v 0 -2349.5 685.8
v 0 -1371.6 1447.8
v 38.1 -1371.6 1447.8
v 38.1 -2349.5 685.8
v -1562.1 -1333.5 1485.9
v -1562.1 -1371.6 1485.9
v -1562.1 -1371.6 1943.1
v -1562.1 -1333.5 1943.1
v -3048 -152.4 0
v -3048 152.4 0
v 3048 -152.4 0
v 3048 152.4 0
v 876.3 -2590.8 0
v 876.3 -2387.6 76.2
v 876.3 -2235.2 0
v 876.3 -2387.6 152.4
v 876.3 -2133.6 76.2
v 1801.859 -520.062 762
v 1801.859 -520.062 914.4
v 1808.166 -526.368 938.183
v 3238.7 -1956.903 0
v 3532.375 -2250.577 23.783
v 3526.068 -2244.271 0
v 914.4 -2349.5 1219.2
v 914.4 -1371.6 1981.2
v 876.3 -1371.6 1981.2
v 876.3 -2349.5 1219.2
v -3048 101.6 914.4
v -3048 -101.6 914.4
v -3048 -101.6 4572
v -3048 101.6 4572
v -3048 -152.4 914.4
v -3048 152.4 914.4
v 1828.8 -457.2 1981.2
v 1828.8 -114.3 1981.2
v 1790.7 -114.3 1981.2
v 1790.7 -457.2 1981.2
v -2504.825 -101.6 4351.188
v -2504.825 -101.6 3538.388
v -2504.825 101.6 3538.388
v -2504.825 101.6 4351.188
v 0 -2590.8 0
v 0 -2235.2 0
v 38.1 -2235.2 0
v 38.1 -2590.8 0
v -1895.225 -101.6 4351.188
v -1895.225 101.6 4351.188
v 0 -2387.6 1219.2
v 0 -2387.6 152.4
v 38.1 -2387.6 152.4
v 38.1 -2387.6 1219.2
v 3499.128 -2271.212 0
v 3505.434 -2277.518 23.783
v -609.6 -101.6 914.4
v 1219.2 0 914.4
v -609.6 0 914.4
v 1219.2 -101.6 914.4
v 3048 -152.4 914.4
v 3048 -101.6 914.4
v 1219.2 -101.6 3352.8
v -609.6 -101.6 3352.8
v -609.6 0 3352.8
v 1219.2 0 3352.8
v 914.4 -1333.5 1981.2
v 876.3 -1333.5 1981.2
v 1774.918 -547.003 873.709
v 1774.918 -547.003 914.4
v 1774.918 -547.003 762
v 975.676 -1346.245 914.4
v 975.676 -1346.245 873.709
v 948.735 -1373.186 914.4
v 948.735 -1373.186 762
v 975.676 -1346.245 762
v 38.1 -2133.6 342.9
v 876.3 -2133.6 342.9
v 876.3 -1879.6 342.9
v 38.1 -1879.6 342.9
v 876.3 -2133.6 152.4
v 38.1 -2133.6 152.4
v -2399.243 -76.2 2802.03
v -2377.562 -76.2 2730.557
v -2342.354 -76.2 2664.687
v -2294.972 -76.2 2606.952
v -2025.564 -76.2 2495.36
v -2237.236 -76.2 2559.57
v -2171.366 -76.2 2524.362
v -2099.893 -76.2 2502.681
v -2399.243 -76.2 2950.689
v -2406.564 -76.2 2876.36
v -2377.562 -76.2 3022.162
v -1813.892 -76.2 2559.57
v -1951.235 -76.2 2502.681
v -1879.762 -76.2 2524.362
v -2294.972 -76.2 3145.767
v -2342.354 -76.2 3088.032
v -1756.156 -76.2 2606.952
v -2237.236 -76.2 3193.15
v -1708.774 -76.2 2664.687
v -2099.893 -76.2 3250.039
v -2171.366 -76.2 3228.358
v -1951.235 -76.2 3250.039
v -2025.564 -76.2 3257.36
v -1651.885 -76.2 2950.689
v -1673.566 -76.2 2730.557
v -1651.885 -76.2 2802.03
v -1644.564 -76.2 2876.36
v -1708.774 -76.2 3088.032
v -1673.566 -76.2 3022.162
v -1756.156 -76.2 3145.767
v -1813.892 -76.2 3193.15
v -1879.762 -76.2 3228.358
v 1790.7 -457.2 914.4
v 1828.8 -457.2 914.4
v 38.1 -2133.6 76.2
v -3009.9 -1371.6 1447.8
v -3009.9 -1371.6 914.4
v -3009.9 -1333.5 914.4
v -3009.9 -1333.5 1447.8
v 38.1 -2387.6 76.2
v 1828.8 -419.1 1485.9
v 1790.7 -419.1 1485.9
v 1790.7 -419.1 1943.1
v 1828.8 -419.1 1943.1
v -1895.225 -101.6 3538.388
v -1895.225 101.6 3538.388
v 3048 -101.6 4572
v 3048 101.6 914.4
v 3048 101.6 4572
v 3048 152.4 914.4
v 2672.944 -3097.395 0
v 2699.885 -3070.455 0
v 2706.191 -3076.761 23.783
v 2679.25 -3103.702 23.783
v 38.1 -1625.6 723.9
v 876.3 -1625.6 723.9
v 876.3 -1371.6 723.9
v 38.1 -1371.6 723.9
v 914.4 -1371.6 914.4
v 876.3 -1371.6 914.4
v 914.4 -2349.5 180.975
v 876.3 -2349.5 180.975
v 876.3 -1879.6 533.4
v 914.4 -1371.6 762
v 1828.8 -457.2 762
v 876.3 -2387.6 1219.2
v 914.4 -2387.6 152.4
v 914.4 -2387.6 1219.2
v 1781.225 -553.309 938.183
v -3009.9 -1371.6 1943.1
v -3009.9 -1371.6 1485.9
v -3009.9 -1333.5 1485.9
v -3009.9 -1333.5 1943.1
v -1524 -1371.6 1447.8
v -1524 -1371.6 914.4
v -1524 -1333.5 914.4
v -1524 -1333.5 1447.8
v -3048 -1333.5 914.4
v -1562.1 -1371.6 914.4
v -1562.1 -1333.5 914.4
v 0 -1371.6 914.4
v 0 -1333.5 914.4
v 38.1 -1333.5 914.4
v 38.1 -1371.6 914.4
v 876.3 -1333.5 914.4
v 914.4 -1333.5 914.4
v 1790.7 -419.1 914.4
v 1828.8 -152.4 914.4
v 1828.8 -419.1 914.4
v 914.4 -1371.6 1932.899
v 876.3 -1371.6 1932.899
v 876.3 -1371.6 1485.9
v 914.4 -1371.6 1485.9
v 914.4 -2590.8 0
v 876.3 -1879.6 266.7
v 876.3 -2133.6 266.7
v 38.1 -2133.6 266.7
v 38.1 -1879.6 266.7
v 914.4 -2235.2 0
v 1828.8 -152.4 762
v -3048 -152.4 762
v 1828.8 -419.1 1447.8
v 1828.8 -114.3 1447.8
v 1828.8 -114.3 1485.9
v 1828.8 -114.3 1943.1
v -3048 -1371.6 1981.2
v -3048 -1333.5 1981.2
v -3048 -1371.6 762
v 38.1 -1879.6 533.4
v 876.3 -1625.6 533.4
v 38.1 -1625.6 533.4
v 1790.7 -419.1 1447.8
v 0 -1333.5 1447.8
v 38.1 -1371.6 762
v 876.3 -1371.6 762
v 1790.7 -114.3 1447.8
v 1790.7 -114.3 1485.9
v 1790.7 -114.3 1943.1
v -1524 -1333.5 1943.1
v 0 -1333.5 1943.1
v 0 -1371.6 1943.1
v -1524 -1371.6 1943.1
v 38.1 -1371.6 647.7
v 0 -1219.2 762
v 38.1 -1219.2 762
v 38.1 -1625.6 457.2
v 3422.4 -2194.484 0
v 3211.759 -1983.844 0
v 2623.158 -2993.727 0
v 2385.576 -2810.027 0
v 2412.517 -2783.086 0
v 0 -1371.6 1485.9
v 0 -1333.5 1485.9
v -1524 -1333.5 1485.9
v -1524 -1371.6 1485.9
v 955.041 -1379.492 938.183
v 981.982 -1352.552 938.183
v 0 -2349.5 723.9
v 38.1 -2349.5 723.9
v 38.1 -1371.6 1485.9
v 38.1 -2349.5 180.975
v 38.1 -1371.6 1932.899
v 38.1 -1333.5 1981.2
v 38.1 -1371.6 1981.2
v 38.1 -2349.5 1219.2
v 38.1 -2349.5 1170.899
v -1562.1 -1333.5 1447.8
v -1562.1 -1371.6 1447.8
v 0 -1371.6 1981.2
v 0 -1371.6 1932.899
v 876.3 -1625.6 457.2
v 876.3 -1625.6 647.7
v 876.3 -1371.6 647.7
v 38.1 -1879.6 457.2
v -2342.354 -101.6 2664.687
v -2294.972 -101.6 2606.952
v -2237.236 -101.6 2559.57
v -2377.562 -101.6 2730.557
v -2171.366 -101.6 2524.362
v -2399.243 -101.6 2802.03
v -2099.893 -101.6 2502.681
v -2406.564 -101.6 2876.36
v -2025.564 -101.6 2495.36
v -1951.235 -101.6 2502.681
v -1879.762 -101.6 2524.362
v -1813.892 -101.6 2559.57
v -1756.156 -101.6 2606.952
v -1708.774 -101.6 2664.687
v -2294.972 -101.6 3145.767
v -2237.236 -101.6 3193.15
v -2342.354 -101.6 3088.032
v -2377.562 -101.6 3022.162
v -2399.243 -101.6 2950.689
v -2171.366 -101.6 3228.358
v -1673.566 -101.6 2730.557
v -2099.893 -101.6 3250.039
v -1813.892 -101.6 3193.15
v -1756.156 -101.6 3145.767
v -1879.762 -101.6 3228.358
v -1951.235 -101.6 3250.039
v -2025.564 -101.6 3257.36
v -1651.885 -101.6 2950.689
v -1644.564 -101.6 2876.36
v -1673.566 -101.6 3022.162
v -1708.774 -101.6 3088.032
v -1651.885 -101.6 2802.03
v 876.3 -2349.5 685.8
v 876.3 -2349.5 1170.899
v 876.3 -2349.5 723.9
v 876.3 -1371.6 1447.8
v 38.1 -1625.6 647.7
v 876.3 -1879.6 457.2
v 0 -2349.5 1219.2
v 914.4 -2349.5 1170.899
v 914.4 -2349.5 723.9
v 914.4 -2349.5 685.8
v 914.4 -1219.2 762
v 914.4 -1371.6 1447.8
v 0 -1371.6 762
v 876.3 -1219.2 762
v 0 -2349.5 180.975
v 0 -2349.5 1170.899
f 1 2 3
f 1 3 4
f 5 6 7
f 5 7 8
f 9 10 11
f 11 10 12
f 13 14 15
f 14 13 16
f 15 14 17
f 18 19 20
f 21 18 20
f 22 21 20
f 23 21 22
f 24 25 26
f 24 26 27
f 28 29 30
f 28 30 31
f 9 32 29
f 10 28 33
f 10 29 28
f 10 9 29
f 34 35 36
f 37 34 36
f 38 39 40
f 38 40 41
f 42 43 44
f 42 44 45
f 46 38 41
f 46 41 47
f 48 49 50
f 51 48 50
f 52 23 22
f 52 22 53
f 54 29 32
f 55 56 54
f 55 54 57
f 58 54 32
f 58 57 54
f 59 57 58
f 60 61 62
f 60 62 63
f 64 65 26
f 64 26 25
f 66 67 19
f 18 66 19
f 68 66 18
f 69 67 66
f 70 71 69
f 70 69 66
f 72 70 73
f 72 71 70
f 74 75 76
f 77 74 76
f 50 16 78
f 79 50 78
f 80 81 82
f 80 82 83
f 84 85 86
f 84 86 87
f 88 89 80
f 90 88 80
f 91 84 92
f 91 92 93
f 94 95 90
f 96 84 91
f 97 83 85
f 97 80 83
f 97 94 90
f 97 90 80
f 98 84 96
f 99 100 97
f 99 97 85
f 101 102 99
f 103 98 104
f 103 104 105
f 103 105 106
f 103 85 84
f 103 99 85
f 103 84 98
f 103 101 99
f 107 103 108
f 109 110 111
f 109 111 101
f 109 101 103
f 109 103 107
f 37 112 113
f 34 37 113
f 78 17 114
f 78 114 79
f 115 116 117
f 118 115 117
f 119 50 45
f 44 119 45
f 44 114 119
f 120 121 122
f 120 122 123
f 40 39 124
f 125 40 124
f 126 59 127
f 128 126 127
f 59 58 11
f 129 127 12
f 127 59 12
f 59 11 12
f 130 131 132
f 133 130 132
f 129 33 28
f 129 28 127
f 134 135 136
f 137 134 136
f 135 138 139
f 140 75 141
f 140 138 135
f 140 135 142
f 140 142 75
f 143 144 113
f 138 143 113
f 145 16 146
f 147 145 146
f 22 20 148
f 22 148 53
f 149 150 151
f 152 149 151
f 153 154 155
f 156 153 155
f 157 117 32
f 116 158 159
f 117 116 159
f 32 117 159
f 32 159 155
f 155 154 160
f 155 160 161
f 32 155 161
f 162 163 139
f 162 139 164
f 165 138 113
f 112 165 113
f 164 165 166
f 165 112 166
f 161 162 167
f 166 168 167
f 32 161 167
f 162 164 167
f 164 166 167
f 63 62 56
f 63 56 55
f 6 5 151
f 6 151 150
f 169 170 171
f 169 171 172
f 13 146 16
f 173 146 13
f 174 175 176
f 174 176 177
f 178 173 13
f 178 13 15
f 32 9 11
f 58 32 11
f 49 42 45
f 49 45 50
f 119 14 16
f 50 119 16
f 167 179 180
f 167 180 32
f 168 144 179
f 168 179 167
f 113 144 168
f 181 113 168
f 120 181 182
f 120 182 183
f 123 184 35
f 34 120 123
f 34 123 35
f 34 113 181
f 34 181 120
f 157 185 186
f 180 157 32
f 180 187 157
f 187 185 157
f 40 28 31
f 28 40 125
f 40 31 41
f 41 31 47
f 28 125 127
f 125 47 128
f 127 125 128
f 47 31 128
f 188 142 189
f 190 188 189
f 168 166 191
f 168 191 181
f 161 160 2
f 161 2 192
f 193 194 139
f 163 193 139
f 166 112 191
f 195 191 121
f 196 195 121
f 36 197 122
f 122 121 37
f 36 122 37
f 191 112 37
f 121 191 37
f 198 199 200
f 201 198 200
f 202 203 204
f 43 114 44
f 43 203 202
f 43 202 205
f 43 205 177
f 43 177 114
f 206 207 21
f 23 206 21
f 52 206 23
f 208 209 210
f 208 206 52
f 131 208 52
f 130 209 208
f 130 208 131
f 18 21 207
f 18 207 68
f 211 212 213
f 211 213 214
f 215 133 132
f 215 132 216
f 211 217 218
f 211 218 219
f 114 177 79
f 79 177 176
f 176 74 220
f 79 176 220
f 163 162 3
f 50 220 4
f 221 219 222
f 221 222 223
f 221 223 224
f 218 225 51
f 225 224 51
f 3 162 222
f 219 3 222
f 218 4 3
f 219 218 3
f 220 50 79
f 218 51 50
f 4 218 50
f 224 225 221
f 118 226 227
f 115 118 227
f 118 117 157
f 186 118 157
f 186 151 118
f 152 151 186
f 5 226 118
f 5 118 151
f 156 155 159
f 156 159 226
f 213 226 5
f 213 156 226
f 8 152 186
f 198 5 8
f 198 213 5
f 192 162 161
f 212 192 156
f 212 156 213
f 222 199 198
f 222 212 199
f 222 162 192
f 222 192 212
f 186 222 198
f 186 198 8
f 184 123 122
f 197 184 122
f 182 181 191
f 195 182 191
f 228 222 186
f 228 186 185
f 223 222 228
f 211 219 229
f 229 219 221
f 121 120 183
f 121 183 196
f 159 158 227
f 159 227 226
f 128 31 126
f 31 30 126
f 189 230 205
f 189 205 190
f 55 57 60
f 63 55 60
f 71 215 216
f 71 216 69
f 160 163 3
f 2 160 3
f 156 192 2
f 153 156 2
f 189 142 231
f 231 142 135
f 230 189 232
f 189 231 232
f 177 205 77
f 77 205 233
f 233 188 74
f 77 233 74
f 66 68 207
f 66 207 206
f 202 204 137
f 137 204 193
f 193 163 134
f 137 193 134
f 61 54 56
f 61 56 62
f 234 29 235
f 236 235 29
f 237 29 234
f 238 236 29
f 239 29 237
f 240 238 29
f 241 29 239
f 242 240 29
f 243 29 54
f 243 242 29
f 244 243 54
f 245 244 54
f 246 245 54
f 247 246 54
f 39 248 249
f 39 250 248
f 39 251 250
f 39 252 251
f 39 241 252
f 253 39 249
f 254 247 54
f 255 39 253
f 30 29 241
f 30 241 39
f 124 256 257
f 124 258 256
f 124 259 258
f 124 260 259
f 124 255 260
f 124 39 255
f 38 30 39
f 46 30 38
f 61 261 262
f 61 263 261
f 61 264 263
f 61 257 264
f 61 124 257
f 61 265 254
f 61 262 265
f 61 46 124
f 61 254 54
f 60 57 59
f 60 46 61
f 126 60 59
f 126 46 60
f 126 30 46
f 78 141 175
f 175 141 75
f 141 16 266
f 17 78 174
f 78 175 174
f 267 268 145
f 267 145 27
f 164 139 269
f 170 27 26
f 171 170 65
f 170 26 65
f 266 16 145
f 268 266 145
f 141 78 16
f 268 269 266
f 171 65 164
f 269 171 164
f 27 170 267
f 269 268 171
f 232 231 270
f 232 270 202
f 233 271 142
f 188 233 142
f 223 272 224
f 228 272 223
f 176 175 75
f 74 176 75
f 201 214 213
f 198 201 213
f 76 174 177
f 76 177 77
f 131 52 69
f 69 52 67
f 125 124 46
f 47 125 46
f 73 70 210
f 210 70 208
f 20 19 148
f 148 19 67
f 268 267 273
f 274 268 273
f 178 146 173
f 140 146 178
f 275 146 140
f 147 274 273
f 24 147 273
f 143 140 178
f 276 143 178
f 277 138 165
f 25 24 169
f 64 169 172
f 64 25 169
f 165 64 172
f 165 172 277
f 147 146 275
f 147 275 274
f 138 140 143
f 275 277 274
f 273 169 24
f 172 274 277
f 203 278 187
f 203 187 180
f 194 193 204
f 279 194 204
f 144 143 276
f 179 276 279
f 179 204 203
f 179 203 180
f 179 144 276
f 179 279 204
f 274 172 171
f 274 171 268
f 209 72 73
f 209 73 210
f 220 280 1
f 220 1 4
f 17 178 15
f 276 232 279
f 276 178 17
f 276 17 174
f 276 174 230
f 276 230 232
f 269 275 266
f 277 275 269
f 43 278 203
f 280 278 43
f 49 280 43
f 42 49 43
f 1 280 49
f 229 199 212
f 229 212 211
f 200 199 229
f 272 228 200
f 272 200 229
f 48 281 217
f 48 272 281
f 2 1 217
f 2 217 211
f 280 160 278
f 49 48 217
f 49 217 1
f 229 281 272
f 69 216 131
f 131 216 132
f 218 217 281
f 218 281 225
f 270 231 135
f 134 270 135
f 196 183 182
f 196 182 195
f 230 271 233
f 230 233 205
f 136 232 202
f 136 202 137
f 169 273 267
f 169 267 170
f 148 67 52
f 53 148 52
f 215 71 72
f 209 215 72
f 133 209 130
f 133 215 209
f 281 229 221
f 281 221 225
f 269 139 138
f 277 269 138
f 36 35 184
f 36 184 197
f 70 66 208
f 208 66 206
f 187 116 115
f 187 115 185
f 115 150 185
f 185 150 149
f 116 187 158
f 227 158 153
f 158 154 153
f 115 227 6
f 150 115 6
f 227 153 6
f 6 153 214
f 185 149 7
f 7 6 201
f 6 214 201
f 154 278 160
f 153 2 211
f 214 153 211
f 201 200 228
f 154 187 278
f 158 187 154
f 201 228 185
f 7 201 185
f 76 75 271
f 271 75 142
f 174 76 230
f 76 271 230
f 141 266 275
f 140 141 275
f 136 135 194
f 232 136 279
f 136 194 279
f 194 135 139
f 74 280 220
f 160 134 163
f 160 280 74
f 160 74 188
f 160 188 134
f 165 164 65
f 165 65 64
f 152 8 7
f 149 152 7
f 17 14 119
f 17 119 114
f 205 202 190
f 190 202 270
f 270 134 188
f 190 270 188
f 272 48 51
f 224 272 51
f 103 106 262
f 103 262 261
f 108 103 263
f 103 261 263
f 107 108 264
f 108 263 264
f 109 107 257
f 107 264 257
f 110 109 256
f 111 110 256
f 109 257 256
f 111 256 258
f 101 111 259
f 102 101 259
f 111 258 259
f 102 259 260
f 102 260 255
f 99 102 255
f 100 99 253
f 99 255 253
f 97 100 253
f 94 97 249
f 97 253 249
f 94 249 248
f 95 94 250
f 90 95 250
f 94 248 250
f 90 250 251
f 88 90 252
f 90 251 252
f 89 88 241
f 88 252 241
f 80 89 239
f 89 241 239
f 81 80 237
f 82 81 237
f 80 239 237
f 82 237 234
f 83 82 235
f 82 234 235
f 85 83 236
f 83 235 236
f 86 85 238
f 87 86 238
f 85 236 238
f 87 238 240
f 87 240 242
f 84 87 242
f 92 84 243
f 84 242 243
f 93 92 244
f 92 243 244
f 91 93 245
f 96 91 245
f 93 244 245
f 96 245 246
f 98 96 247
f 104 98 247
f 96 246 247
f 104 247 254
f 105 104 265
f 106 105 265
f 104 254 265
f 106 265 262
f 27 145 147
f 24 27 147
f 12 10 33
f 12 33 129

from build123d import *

# Parameters (mm, degrees)
F0_W      = 6096
F0_H      = 304.8
F1_DEPTH  = 914.4
F2_W      = 6096
F2_H      = 3657.6
F3_DEPTH  = 101.6
F5_W      = 1219.2
F5_H      = 152.4
F6_DEPTH  = 4876.8
F7_W      = 1828.8
F7_H      = 2438.4
F8_DEPTH  = 101.6
F9_SIZE   = 914.4
F12_W     = 254
F12_H     = 76.2
F13_DEPTH = 38.1
F14_DEPTH = 914.4
F15_W     = 254
F15_H     = 76.2
F16_DEPTH = 38.1
F17_W     = 38.1
F17_H     = 38.1
F18_DEPTH = 1066.8
F19_W     = 38.1
F19_H     = 38.1
F20_DEPTH = 3048
F21_W     = 38.1
F21_H     = 38.1
F22_DEPTH = 304.8
F23_W     = 38.1
F23_H     = 38.1
F24_DEPTH = 1066.8
F26_DEPTH = 38.1
F28_DEPTH = 38.1
F32_DEPTH = 38.1
F34_DEPTH = 25.4
F35_DEPTH = 1168.4
F37_DEPTH = 38.1
F38_R     = 381
F39_DEPTH = 25.4
F40_W     = 609.6
F40_H     = 812.8
F41_DEPTH = 254.001


with BuildPart() as f1:
    # F0 (on Top) → F1 (new body)
    with BuildSketch(Plane.XY):
        Rectangle(F0_W, F0_H)
    extrude(amount=F1_DEPTH)

    # F2 (on Front) → F3 (join, symmetric)
    with BuildSketch(Plane.XZ):
        with Locations((0, 2743.2)):
            Rectangle(F2_W, F2_H)
    extrude(amount=F3_DEPTH, both=True)

    # F7 (on face) → F8 (cut)
    with BuildSketch(Plane.XZ.offset(101.6)):
        with Locations((304.8, 2133.6)):
            Rectangle(F7_W, F7_H)
    extrude(amount=-F8_DEPTH, mode=Mode.SUBTRACT)

    # F38 (on face) → F39 (cut)
    with BuildSketch(Plane.XZ.offset(101.6)):
        with Locations((-2025.563955307, 2876.3597011566)):
            Circle(F38_R)
    extrude(amount=-F39_DEPTH, mode=Mode.SUBTRACT)

    # F40 (on face) → F41 (cut, through all)
    with BuildSketch(Plane.XZ.offset(101.6)):
        with Locations((-2200.0251152039, 3944.7877754211)):
            Rectangle(F40_W, F40_H)
    extrude(amount=-F41_DEPTH, mode=Mode.SUBTRACT)


with BuildPart() as f6:
    # F5 (on offset) → F6 (new body)
    with BuildSketch(Plane.YZ.offset(1828.8)):
        with Locations((-762, 838.2)):
            Rectangle(F5_W, F5_H)
    extrude(amount=-F6_DEPTH)

    # F9
    f9_edges = [f6.edges().sort_by_distance(p)[0] for p in [
        (1828.8, -1371.6, 838.2),
    ]]
    chamfer(f9_edges, length=F9_SIZE)

    # F12 (on plane+point) → F13 (join)
    with BuildSketch(Plane.YZ.offset(914.4)):
        Polygon((-2235.2, 0), (-2133.6, 76.2), (-2387.6, 76.2), (-2387.6, 152.4), (-2590.8, 0), align=None)
        with Locations((-2260.6, 114.3)):
            Rectangle(F12_W, F12_H)
        Polygon((-2133.6, 76.2), (-1879.6, 266.7), (-2133.6, 266.7), (-2133.6, 342.9), (-2387.6, 152.4), (-2133.6, 152.4), align=None)
        with Locations((-2006.6, 304.8)):
            Rectangle(F12_W, F12_H)
        Polygon((-1879.6, 266.7), (-1625.6, 457.2), (-1879.6, 457.2), (-1879.6, 533.4), (-2133.6, 342.9), (-1879.6, 342.9), align=None)
        with Locations((-1752.6, 495.3)):
            Rectangle(F12_W, F12_H)
        Polygon((-1625.6, 457.2), (-1371.6, 647.7), (-1625.6, 647.7), (-1625.6, 723.9), (-1879.6, 533.4), (-1625.6, 533.4), align=None)
        with Locations((-1498.6, 685.8)):
            Rectangle(F12_W, F12_H)
        Polygon((-1371.6, 647.7), (-1219.2, 762), (-1371.6, 762), (-1371.6, 914.4), (-1625.6, 723.9), (-1371.6, 723.9), align=None)
    extrude(amount=-F13_DEPTH)

    # F12 (on plane+point) → F14 (join)
    with BuildSketch(Plane.YZ.offset(914.4)):
        with Locations((-2260.6, 114.3)):
            Rectangle(F12_W, F12_H)
        with Locations((-2006.6, 304.8)):
            Rectangle(F12_W, F12_H)
        with Locations((-1752.6, 495.3)):
            Rectangle(F12_W, F12_H)
        with Locations((-1498.6, 685.8)):
            Rectangle(F12_W, F12_H)
    extrude(amount=-F14_DEPTH)

    # F15 (on face) → F16 (join)
    with BuildSketch(Plane(origin=(0, 0, 0), x_dir=(0, -1, 0), z_dir=(-1, 0, 0))):
        Polygon((1371.6, 914.4), (1371.6, 762), (1219.2, 762), (1371.6, 647.7), (1371.6, 723.9), (1625.6, 723.9), align=None)
        with Locations((1498.6, 685.8)):
            Rectangle(F15_W, F15_H)
        Polygon((2590.8, 0), (1625.6, 723.9), (1625.6, 647.7), (1371.6, 647.7), (2235.2, 0), align=None)
    extrude(amount=-F16_DEPTH)

    # F17 (on face) → F18 (join)
    with BuildSketch(Plane.XY.offset(914.4)):
        with Locations((-3028.95, -1352.55)):
            Rectangle(F17_W, F17_H)
        with Locations((-1543.05, -1352.55)):
            Rectangle(F17_W, F17_H)
        with Locations((19.05, -1352.55)):
            Rectangle(F17_W, F17_H)
        with Locations((895.35, -1352.55)):
            Rectangle(F17_W, F17_H)
        with Locations((1809.75, -438.15)):
            Rectangle(F17_W, F17_H)
    extrude(amount=F18_DEPTH)

    # F19 (on face) → F20 (join, through all)
    with BuildSketch(Plane(origin=(0, 0, 0), x_dir=(0, -1, 0), z_dir=(-1, 0, 0))):
        with Locations((1352.55, 1962.15)):
            Rectangle(F19_W, F19_H)
        with Locations((1352.55, 1466.85)):
            Rectangle(F19_W, F19_H)
    extrude(amount=F20_DEPTH)

    # F21 (on face) → F22 (join)
    with BuildSketch(Plane(origin=(0, -419.1, 0), x_dir=(-1, 0, 0), z_dir=(0, 1, 0))):
        with Locations((-1809.75, 1962.15)):
            Rectangle(F21_W, F21_H)
        with Locations((-1809.75, 1466.85)):
            Rectangle(F21_W, F21_H)
    extrude(amount=F22_DEPTH)

    # F23 (on face) → F24 (join)
    with BuildSketch(Plane.XY.offset(152.4)):
        with Locations((19.05, -2368.55)):
            Rectangle(F23_W, F23_H)
        with Locations((895.35, -2368.55)):
            Rectangle(F23_W, F23_H)
    extrude(amount=F24_DEPTH)

    # F25 (on face) → F26 (join)
    with BuildSketch(Plane(origin=(0, 0, 0), x_dir=(0, -1, 0), z_dir=(-1, 0, 0))):
        Polygon((2349.5, 1219.2), (1371.6, 1981.2), (1371.6, 1932.8988007302), (2349.5, 1170.8988007302), align=None)
        Polygon((2349.5, 723.9), (1371.6, 1485.9), (1371.6, 1447.8), (2349.5, 685.8), align=None)
    extrude(amount=-F26_DEPTH)

    # F27 (on face) → F28 (join)
    with BuildSketch(Plane.YZ.offset(914.4)):
        Polygon((-1371.6, 1981.2), (-2349.5, 1219.2), (-2349.5, 1170.8988007302), (-1371.6, 1932.8988007302), align=None)
        Polygon((-1371.6, 1485.9), (-2349.5, 723.9), (-2349.5, 685.8), (-1371.6, 1447.8), align=None)
    extrude(amount=-F28_DEPTH)


with BuildPart() as f32:
    # F31 (on face) → F32 (new body)
    with BuildSketch(Plane(origin=(640.8987193947, 640.8987193947, 0), x_dir=(-0.7071067812, 0.7071067812, 0), z_dir=(0.7071067812, 0.7071067812, 0))):
        Polygon((-1641.8461017924, 762), (-1641.8461017924, 914.4), (-4080.2461017924, 0), (-3673.8461017924, 0), align=None)
    extrude(amount=-F32_DEPTH)

    # F34 (add): a face of the model
    f34_faces = [f32.faces().sort_by_distance(p)[0] for p in [
        (2650.4934350778, -1395.6367646517, 457.2),
    ]]
    extrude(f34_faces, amount=F34_DEPTH)

    # F33 (on face) → F35 (join)
    with BuildSketch(Plane(origin=(613.9579510314, 613.9579510314, 0), x_dir=(0.7071067812, -0.7071067812, 0), z_dir=(-0.7071067812, -0.7071067812, 0))):
        Polygon((1641.8461017924, 914.4), (1641.8461017924, 873.7091821629), (3971.7372542269, 0), (4080.2461017924, 0), align=None)
    extrude(amount=F35_DEPTH)

    # F36 (on face) → F37 (join)
    with BuildSketch(Plane(origin=(-212.2256121069, -212.2256121069, 0), x_dir=(0.7071067812, -0.7071067812, 0), z_dir=(-0.7071067812, -0.7071067812, 0))):
        Polygon((3673.8461017924, 0), (3971.7372542269, 0), (1641.8461017924, 873.7091821629), (1641.8461017924, 762), align=None)
        Polygon((3971.7372542269, 0), (4080.2461017924, 0), (1641.8461017924, 914.4), (1641.8461017924, 873.7091821629), align=None)
        Polygon((4080.2461017924, 0), (4089.1646372088, 23.7827611103), (1650.7646372088, 938.1827611103), (1641.8461017924, 914.4), align=None)
    extrude(amount=-F37_DEPTH)


solid = Compound([f1.part, f6.part, f32.part])
